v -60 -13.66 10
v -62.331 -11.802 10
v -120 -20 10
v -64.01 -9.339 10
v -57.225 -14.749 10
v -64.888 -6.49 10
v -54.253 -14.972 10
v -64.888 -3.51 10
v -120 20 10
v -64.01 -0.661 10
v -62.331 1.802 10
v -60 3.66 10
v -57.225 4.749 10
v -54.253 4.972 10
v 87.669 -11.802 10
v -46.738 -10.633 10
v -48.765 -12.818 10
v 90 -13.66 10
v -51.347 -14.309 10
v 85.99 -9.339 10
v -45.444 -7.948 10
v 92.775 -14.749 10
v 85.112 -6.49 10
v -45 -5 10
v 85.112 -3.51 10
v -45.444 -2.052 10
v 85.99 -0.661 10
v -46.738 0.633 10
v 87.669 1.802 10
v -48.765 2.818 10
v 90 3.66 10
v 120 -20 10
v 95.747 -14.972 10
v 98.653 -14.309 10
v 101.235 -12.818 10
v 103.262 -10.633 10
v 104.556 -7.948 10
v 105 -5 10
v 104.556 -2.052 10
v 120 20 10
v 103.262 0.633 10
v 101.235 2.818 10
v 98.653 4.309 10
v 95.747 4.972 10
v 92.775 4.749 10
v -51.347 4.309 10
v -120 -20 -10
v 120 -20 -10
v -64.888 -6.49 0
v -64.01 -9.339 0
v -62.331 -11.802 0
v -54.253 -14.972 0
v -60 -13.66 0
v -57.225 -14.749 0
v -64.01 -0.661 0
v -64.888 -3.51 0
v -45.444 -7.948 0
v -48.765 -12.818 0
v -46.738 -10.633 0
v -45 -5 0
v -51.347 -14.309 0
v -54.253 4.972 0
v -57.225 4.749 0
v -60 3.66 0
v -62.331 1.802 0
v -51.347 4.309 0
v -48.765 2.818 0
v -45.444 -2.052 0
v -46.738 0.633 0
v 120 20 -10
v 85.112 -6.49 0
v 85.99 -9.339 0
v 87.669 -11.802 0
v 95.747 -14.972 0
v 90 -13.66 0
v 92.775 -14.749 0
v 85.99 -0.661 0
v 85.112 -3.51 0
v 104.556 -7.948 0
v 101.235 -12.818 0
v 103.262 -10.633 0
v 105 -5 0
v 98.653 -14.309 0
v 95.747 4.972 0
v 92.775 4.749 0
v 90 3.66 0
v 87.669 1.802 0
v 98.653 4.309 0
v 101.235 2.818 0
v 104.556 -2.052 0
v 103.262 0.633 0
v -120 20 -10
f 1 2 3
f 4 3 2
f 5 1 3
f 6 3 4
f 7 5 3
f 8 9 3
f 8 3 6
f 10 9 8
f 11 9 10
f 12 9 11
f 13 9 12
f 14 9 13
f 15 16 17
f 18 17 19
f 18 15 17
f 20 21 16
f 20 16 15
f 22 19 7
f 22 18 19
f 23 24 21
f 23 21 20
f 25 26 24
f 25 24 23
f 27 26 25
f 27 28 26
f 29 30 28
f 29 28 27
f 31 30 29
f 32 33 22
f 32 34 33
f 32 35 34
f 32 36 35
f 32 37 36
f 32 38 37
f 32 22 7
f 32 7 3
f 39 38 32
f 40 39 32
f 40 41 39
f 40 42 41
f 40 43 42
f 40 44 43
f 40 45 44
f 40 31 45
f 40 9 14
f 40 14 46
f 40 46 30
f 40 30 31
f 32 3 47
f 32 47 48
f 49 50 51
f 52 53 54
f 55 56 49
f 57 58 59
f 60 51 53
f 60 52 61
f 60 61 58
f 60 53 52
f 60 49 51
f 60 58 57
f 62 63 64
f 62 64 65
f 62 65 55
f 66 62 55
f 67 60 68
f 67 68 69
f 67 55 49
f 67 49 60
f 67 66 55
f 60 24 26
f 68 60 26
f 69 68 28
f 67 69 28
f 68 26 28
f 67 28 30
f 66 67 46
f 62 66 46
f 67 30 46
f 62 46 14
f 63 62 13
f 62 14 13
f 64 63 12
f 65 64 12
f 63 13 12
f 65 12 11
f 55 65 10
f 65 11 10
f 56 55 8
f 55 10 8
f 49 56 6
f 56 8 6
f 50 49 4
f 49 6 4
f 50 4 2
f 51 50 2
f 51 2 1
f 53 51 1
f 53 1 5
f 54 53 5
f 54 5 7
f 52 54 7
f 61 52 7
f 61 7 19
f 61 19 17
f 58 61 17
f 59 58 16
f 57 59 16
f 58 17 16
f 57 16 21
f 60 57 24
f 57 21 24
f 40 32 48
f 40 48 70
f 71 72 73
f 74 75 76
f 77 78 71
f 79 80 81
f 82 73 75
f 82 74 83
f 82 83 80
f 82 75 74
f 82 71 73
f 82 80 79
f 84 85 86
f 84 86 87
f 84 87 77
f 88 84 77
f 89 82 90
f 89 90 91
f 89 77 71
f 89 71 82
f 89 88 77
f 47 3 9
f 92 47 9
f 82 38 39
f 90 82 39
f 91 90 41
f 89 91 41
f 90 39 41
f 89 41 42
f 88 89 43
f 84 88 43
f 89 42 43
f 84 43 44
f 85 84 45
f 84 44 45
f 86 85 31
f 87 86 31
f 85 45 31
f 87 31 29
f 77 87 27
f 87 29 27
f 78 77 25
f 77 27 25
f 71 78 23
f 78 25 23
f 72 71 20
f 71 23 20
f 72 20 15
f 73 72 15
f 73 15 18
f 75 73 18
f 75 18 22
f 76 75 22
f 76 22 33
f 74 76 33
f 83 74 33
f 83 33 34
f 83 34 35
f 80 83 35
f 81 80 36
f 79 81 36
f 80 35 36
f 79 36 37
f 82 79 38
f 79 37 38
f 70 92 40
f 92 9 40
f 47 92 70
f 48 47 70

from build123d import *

# Parameters (mm, degrees)
F0_W     = 240
F0_H     = 40
F1_DEPTH = 10
F2_R     = 10
F3_DEPTH = 10


with BuildPart() as f1:
    # F0 (on Top) → F1 (new body, symmetric)
    with BuildSketch(Plane.XY):
        Rectangle(F0_W, F0_H)
    extrude(amount=F1_DEPTH, both=True)

    # F2 (on face) → F3 (cut)
    with BuildSketch(Plane.XY.offset(10)):
        with Locations((-55, -5)):
            Circle(F2_R)
        with Locations((95, -5)):
            Circle(F2_R)
    extrude(amount=-F3_DEPTH, mode=Mode.SUBTRACT)


solid = f1.part
